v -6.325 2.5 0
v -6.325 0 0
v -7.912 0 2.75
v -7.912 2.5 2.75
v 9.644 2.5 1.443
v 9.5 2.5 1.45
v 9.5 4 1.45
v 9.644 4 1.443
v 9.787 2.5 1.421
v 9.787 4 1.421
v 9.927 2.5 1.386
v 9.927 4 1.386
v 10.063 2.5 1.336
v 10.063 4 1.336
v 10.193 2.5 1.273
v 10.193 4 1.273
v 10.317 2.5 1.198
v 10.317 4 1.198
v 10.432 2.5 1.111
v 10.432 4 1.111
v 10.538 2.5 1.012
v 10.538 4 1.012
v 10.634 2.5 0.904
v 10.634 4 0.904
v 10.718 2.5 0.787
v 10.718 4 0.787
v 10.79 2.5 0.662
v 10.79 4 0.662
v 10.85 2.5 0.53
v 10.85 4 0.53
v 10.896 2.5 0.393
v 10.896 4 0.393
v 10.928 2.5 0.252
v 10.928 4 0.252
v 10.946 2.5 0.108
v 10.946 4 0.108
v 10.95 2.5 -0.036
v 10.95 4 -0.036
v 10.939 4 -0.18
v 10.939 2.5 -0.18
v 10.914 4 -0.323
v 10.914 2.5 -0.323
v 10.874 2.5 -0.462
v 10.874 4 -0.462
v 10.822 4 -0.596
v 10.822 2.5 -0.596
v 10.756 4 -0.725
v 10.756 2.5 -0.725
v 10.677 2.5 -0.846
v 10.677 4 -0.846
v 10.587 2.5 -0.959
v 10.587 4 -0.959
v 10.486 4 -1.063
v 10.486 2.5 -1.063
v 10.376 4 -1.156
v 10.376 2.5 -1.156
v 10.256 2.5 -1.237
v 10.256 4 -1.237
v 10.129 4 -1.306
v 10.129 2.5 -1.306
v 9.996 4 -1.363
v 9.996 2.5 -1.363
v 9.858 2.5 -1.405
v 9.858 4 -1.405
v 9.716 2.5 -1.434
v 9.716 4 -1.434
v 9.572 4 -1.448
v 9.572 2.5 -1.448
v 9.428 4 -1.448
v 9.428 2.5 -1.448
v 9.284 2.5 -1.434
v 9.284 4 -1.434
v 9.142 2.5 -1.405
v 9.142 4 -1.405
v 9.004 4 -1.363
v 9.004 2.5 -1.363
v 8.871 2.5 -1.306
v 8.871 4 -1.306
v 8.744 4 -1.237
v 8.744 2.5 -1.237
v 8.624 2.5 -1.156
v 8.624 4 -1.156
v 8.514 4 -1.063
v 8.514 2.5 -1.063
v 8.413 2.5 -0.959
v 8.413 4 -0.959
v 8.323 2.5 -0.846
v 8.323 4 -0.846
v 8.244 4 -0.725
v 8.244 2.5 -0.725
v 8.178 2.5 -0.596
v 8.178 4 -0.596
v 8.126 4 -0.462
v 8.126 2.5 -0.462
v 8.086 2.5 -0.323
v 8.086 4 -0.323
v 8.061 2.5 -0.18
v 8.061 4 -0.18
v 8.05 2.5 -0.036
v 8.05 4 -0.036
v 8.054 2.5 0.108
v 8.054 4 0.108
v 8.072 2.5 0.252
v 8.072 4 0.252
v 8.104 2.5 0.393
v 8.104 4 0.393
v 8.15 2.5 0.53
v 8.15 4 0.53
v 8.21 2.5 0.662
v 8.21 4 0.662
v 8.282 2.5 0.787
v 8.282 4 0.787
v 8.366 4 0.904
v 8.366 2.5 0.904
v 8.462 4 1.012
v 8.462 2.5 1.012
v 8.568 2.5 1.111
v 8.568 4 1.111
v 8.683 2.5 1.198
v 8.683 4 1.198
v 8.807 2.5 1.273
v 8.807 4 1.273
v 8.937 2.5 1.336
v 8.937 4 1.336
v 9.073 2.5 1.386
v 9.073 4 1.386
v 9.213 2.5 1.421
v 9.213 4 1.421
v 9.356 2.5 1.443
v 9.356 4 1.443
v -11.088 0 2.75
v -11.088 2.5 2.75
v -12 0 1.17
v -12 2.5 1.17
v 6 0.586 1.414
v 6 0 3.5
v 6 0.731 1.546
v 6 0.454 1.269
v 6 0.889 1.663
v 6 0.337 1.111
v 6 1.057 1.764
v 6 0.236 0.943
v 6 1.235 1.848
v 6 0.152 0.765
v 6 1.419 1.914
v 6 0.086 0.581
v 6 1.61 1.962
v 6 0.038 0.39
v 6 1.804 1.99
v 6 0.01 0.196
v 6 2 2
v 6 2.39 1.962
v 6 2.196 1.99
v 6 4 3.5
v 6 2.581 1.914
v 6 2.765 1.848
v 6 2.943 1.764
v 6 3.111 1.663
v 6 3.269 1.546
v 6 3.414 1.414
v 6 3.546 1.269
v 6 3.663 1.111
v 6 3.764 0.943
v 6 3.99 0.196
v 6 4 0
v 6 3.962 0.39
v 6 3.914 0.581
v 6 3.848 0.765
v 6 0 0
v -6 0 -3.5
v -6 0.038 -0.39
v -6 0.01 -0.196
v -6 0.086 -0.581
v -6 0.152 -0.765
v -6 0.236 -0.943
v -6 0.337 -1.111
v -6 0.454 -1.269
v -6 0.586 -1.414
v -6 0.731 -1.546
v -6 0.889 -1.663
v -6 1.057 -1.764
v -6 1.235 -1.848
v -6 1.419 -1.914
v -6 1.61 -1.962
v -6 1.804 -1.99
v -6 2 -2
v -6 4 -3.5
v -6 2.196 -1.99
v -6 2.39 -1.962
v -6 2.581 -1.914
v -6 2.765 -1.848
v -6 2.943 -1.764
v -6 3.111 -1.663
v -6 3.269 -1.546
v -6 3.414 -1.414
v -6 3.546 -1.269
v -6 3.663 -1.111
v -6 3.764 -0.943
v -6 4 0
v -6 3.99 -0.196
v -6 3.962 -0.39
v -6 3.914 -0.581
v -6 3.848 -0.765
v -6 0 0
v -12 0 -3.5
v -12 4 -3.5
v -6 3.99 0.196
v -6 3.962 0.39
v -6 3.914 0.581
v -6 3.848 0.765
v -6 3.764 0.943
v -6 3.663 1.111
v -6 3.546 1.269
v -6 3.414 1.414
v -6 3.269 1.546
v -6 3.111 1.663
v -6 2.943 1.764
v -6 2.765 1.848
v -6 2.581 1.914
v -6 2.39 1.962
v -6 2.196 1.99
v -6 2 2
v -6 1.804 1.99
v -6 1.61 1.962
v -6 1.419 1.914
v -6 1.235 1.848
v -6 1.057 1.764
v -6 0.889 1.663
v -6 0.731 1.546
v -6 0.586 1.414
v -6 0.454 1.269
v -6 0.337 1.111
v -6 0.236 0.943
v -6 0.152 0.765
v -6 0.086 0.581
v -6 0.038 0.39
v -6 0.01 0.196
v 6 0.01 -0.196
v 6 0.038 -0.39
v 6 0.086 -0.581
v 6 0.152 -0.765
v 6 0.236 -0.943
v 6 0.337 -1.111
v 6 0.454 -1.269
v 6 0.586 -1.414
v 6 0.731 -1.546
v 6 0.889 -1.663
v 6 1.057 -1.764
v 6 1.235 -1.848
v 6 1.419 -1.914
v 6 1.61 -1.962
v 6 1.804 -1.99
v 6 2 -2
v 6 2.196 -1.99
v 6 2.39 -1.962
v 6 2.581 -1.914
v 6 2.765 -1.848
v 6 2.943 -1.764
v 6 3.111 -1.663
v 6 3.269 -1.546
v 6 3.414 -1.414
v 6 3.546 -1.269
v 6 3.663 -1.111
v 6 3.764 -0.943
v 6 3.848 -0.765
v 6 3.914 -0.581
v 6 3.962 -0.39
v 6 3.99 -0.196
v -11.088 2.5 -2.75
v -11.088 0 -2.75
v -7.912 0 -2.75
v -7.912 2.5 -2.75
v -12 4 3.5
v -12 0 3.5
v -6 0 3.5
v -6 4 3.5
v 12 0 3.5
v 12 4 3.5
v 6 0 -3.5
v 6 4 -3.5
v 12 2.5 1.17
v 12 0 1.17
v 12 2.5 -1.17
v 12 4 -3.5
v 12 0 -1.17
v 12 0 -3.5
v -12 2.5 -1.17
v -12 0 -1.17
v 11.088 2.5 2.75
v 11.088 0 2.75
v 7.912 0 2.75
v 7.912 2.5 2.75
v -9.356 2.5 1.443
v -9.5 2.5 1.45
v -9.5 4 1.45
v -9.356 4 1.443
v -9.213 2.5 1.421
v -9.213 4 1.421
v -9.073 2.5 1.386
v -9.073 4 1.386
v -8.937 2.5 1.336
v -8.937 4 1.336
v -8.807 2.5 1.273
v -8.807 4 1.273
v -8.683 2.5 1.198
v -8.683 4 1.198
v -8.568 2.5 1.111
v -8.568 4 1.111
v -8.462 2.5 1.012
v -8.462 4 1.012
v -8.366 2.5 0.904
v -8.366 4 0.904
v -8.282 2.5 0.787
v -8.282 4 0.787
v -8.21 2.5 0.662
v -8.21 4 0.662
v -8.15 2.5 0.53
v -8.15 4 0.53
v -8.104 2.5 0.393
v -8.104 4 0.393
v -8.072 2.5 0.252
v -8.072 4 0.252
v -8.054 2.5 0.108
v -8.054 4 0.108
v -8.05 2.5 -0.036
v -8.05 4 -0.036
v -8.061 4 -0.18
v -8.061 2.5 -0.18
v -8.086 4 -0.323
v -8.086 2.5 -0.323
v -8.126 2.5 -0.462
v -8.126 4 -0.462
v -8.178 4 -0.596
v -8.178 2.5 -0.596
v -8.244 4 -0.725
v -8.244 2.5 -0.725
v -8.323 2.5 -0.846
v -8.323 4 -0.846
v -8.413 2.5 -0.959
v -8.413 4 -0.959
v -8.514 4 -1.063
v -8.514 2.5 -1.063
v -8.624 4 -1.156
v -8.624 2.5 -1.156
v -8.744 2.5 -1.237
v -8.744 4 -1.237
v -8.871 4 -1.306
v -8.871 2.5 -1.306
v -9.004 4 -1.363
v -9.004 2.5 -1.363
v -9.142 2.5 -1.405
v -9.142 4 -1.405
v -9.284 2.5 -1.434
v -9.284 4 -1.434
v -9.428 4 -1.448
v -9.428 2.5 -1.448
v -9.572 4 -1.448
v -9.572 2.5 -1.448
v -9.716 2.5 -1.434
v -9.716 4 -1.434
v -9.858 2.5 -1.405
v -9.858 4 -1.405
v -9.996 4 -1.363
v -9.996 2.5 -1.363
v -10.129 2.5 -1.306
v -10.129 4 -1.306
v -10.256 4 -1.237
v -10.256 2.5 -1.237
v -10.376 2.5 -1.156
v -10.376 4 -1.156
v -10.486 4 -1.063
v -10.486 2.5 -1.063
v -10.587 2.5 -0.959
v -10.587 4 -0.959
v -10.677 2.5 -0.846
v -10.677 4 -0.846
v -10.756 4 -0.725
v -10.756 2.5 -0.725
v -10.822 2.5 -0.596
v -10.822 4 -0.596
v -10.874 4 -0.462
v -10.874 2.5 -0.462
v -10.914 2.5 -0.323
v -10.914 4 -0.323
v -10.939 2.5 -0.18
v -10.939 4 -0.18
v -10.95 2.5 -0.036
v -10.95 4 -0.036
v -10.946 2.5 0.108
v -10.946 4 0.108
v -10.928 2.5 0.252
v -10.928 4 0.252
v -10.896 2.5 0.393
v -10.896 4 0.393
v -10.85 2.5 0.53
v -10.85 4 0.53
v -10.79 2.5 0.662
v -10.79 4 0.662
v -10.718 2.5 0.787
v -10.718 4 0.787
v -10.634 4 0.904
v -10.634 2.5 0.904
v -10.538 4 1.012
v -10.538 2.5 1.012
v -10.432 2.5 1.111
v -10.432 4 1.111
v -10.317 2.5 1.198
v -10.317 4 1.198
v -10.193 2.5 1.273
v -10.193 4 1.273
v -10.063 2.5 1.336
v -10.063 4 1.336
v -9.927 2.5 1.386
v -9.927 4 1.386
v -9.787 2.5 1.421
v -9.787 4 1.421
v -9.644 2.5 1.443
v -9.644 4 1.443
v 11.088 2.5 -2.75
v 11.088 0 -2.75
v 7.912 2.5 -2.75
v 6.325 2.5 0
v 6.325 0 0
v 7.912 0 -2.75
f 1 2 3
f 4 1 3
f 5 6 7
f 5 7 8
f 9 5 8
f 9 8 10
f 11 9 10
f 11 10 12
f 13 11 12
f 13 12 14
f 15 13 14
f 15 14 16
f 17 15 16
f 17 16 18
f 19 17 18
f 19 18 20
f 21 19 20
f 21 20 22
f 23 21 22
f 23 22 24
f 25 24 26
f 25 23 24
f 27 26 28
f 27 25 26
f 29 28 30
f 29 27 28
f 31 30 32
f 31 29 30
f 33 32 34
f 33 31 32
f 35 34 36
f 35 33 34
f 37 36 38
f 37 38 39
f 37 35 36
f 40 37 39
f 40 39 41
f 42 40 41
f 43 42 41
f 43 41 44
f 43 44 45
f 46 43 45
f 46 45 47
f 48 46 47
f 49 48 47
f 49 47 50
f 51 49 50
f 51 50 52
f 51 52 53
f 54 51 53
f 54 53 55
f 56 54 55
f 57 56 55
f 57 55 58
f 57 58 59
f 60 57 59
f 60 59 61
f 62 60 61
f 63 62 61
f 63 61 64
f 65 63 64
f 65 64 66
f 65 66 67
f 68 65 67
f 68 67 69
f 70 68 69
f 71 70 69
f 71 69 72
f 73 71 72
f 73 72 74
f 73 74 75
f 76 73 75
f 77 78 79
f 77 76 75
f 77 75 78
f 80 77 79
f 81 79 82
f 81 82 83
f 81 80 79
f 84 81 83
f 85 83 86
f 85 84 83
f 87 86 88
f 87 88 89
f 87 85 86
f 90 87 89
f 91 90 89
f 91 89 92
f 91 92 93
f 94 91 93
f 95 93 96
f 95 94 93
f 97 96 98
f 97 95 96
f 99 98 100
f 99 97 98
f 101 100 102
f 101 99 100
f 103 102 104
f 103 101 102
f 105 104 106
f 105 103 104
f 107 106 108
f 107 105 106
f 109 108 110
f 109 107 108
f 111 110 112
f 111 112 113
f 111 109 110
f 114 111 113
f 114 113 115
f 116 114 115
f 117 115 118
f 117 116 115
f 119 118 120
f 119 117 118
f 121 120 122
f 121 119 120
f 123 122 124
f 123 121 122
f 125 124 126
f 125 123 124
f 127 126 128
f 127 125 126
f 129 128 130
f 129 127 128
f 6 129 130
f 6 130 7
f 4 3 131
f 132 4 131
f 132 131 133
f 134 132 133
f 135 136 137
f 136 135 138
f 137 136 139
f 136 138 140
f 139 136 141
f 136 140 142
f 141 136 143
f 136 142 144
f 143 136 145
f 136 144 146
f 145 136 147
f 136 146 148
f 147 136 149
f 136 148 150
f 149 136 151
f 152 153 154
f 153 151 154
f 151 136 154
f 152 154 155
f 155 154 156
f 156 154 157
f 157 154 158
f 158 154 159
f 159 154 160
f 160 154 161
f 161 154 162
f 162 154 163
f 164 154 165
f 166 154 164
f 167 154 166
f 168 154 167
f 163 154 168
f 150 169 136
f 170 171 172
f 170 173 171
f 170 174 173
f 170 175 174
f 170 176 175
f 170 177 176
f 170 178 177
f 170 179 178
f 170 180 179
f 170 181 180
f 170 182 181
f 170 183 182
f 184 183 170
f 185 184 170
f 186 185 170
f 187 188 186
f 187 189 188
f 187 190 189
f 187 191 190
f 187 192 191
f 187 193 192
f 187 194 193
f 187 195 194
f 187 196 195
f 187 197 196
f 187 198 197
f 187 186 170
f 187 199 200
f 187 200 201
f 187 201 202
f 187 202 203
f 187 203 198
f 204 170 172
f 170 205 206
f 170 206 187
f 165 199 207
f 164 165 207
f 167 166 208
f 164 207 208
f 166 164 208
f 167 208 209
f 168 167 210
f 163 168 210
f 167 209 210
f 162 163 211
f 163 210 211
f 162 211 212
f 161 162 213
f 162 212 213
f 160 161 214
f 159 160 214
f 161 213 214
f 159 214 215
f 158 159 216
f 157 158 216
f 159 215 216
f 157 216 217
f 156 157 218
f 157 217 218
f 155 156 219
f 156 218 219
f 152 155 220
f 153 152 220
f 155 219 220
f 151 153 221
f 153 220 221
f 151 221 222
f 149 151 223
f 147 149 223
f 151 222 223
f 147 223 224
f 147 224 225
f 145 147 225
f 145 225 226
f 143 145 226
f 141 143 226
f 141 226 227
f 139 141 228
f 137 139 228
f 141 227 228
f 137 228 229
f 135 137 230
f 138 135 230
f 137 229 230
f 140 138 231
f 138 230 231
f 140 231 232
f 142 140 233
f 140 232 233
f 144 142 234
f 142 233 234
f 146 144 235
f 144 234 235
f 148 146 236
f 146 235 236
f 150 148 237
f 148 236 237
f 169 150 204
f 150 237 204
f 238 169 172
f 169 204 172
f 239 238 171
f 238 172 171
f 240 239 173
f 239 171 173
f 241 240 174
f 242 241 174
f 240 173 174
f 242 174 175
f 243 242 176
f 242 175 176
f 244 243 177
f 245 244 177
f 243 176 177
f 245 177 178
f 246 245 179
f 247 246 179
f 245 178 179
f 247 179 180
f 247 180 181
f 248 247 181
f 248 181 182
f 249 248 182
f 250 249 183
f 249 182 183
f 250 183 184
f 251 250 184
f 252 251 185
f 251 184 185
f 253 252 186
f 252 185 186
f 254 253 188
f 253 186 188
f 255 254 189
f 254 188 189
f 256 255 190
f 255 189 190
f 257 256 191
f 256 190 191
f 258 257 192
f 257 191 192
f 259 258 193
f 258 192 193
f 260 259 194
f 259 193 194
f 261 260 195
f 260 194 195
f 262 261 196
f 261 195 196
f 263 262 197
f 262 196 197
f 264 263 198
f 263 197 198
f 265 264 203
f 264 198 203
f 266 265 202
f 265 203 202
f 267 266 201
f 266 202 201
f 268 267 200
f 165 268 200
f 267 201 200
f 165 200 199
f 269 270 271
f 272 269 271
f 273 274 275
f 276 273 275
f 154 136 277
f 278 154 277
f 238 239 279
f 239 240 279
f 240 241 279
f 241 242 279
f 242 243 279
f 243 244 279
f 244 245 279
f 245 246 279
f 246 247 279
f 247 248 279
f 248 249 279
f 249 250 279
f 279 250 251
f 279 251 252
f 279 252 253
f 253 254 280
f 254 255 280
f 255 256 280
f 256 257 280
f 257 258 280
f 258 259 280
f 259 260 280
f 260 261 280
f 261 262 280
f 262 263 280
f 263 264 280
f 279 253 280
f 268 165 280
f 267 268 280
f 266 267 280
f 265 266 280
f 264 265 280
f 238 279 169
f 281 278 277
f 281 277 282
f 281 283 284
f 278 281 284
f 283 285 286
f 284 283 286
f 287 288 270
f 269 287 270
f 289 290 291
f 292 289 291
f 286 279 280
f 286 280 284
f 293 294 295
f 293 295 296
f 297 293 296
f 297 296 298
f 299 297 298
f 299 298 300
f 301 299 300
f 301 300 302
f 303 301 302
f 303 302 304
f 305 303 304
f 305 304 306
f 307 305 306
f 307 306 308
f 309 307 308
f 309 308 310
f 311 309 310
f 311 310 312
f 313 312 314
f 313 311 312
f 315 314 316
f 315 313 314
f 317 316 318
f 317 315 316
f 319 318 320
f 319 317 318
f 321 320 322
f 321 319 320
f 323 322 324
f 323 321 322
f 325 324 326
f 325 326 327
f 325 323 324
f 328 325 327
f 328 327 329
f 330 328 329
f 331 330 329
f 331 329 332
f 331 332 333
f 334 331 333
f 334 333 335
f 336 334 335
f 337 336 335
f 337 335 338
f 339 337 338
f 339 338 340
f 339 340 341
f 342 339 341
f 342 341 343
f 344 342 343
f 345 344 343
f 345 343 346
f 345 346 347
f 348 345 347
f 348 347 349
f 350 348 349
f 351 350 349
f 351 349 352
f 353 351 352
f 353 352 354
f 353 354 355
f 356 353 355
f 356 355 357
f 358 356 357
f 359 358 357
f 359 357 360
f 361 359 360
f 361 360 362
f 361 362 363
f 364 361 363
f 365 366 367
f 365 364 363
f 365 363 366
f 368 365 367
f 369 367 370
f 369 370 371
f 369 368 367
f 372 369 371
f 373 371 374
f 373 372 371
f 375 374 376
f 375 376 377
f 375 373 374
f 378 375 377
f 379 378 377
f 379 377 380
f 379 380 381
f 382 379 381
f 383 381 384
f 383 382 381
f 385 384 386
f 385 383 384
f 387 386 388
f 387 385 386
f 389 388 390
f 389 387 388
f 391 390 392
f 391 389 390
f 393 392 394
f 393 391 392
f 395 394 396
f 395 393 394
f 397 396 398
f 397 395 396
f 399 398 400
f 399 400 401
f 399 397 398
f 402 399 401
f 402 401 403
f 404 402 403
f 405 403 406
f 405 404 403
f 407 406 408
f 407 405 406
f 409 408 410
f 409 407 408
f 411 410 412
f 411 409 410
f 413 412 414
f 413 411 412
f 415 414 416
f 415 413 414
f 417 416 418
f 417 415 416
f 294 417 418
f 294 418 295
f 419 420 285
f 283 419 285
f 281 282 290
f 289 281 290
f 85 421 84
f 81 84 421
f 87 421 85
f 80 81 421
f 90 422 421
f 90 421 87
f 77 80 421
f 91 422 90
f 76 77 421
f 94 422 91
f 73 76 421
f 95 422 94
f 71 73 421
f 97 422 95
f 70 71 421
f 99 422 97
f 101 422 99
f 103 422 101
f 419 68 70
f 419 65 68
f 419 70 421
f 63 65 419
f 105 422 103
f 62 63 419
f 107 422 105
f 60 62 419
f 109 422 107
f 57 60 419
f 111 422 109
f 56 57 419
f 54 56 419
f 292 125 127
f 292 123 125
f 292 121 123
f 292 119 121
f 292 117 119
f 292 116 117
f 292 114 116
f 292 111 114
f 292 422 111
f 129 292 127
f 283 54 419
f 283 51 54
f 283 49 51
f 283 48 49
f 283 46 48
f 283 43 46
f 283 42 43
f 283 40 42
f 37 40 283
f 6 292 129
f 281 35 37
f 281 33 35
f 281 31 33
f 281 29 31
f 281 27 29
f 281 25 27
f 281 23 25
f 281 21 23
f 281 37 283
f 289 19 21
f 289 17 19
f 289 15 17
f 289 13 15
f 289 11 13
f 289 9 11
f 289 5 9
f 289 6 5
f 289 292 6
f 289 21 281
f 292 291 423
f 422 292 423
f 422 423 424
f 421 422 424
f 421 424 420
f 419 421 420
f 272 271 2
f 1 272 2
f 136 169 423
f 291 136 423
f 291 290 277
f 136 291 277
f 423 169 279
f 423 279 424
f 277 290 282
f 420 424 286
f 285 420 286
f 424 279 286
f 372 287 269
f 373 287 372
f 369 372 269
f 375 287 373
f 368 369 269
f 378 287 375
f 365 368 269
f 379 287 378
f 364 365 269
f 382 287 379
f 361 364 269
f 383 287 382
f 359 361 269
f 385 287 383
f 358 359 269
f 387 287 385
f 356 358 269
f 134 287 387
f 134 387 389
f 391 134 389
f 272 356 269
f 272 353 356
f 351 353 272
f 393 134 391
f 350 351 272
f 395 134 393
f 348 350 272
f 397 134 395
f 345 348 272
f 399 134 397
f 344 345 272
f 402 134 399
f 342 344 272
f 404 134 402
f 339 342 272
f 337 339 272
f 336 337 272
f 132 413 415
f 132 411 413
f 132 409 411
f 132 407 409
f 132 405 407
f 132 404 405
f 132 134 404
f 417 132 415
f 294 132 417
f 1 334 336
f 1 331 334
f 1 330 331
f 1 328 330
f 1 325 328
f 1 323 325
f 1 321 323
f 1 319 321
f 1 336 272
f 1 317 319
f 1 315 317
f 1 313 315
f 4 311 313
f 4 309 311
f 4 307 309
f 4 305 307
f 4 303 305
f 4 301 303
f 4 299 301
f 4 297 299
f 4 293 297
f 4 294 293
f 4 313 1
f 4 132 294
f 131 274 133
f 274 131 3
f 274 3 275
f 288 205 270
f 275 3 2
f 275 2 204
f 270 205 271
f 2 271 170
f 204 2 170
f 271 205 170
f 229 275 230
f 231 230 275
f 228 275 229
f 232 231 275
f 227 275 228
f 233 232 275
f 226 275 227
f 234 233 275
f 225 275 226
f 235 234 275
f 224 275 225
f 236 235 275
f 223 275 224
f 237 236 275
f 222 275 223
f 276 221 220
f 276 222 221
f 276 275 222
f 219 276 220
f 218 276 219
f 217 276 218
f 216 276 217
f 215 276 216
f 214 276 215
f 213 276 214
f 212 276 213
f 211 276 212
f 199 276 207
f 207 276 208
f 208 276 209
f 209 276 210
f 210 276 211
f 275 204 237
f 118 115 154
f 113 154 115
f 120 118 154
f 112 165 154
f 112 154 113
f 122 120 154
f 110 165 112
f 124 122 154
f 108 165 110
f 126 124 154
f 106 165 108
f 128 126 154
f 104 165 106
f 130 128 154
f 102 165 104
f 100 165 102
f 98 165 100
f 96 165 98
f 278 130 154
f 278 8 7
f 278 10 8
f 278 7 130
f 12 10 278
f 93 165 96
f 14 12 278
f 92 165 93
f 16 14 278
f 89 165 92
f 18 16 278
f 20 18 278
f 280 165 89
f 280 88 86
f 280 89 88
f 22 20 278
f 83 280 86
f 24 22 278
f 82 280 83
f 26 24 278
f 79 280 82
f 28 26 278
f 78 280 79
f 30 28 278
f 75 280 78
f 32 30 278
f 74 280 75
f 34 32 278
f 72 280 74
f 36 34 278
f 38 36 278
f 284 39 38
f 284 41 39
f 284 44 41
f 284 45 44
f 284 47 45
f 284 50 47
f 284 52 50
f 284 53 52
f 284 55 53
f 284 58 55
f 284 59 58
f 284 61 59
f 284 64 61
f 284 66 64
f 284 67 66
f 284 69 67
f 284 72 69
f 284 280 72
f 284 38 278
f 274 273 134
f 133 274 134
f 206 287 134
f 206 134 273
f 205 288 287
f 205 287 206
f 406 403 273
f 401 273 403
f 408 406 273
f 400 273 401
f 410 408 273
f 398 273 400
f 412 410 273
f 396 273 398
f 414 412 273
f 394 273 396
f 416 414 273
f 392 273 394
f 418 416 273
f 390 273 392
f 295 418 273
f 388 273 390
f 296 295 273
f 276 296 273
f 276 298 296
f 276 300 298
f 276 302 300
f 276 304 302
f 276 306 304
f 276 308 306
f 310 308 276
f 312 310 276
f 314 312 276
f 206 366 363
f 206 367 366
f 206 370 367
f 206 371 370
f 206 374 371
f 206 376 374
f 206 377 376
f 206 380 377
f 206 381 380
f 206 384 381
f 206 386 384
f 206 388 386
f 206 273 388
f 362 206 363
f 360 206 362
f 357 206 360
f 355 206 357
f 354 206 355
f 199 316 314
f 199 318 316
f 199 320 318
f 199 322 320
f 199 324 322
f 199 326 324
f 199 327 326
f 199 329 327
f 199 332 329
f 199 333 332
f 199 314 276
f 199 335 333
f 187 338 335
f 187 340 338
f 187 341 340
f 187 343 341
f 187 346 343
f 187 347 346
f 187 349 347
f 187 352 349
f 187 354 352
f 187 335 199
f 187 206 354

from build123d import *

# Parameters (mm, degrees)
SKETCH_1_W          = 24
SKETCH_1_H          = 7
SKETCH_1_R          = 1.45
EXTRUDE_1_DEPTH     = 4
CUT_EXTRUDE_1_DEPTH = 2.5
SKETCH_3_W          = 8.18570746
SKETCH_3_H          = 5.156071163
SKETCH_3_R          = 2
CUT_EXTRUDE_2_DEPTH = 6


with BuildPart() as part:
    # Эскиз1 → Бобышка-Вытянуть1 (new body)
    with BuildSketch(Plane(origin=(0, 0, 0), x_dir=(1, 0, 0), z_dir=(0, 1, 0))):
        Rectangle(SKETCH_1_W, SKETCH_1_H)
        with Locations(Location((-9.5, 0, 0), (0, 0, 270))):
            Circle(SKETCH_1_R, mode=Mode.SUBTRACT)
        with Locations(Location((9.5, 0, 0), (0, 0, 270))):
            Circle(SKETCH_1_R, mode=Mode.SUBTRACT)
    extrude(amount=EXTRUDE_1_DEPTH)

    # Эскиз2 → Вырез-Вытянуть1 (cut)
    with BuildSketch(Plane.XZ):
        Polygon((-7.91228676, 2.75), (-11.08771324, 2.75), (-12.675426481, 0), (-11.08771324, -2.75), (-7.91228676, -2.75), (-6.324573519, 0), align=None)
        Polygon((7.91228676, -2.75), (11.08771324, -2.75), (12.675426481, 0), (11.08771324, 2.75), (7.91228676, 2.75), (6.324573519, 0), align=None)
    extrude(amount=-CUT_EXTRUDE_1_DEPTH, mode=Mode.SUBTRACT)

    # Эскиз3 → Вырез-Вытянуть2 (cut, symmetric)
    with BuildSketch(Plane(origin=(0, 0, 0), x_dir=(0, 0, -1), z_dir=(1, 0, 0))):
        with Locations((0.188463291, 1.886210844)):
            Rectangle(SKETCH_3_W, SKETCH_3_H)
        with Locations(Location((0, 2, 0), (0, 0, 90))):
            Circle(SKETCH_3_R, mode=Mode.SUBTRACT)
    extrude(amount=CUT_EXTRUDE_2_DEPTH, both=True, mode=Mode.SUBTRACT)


solid = part.part
